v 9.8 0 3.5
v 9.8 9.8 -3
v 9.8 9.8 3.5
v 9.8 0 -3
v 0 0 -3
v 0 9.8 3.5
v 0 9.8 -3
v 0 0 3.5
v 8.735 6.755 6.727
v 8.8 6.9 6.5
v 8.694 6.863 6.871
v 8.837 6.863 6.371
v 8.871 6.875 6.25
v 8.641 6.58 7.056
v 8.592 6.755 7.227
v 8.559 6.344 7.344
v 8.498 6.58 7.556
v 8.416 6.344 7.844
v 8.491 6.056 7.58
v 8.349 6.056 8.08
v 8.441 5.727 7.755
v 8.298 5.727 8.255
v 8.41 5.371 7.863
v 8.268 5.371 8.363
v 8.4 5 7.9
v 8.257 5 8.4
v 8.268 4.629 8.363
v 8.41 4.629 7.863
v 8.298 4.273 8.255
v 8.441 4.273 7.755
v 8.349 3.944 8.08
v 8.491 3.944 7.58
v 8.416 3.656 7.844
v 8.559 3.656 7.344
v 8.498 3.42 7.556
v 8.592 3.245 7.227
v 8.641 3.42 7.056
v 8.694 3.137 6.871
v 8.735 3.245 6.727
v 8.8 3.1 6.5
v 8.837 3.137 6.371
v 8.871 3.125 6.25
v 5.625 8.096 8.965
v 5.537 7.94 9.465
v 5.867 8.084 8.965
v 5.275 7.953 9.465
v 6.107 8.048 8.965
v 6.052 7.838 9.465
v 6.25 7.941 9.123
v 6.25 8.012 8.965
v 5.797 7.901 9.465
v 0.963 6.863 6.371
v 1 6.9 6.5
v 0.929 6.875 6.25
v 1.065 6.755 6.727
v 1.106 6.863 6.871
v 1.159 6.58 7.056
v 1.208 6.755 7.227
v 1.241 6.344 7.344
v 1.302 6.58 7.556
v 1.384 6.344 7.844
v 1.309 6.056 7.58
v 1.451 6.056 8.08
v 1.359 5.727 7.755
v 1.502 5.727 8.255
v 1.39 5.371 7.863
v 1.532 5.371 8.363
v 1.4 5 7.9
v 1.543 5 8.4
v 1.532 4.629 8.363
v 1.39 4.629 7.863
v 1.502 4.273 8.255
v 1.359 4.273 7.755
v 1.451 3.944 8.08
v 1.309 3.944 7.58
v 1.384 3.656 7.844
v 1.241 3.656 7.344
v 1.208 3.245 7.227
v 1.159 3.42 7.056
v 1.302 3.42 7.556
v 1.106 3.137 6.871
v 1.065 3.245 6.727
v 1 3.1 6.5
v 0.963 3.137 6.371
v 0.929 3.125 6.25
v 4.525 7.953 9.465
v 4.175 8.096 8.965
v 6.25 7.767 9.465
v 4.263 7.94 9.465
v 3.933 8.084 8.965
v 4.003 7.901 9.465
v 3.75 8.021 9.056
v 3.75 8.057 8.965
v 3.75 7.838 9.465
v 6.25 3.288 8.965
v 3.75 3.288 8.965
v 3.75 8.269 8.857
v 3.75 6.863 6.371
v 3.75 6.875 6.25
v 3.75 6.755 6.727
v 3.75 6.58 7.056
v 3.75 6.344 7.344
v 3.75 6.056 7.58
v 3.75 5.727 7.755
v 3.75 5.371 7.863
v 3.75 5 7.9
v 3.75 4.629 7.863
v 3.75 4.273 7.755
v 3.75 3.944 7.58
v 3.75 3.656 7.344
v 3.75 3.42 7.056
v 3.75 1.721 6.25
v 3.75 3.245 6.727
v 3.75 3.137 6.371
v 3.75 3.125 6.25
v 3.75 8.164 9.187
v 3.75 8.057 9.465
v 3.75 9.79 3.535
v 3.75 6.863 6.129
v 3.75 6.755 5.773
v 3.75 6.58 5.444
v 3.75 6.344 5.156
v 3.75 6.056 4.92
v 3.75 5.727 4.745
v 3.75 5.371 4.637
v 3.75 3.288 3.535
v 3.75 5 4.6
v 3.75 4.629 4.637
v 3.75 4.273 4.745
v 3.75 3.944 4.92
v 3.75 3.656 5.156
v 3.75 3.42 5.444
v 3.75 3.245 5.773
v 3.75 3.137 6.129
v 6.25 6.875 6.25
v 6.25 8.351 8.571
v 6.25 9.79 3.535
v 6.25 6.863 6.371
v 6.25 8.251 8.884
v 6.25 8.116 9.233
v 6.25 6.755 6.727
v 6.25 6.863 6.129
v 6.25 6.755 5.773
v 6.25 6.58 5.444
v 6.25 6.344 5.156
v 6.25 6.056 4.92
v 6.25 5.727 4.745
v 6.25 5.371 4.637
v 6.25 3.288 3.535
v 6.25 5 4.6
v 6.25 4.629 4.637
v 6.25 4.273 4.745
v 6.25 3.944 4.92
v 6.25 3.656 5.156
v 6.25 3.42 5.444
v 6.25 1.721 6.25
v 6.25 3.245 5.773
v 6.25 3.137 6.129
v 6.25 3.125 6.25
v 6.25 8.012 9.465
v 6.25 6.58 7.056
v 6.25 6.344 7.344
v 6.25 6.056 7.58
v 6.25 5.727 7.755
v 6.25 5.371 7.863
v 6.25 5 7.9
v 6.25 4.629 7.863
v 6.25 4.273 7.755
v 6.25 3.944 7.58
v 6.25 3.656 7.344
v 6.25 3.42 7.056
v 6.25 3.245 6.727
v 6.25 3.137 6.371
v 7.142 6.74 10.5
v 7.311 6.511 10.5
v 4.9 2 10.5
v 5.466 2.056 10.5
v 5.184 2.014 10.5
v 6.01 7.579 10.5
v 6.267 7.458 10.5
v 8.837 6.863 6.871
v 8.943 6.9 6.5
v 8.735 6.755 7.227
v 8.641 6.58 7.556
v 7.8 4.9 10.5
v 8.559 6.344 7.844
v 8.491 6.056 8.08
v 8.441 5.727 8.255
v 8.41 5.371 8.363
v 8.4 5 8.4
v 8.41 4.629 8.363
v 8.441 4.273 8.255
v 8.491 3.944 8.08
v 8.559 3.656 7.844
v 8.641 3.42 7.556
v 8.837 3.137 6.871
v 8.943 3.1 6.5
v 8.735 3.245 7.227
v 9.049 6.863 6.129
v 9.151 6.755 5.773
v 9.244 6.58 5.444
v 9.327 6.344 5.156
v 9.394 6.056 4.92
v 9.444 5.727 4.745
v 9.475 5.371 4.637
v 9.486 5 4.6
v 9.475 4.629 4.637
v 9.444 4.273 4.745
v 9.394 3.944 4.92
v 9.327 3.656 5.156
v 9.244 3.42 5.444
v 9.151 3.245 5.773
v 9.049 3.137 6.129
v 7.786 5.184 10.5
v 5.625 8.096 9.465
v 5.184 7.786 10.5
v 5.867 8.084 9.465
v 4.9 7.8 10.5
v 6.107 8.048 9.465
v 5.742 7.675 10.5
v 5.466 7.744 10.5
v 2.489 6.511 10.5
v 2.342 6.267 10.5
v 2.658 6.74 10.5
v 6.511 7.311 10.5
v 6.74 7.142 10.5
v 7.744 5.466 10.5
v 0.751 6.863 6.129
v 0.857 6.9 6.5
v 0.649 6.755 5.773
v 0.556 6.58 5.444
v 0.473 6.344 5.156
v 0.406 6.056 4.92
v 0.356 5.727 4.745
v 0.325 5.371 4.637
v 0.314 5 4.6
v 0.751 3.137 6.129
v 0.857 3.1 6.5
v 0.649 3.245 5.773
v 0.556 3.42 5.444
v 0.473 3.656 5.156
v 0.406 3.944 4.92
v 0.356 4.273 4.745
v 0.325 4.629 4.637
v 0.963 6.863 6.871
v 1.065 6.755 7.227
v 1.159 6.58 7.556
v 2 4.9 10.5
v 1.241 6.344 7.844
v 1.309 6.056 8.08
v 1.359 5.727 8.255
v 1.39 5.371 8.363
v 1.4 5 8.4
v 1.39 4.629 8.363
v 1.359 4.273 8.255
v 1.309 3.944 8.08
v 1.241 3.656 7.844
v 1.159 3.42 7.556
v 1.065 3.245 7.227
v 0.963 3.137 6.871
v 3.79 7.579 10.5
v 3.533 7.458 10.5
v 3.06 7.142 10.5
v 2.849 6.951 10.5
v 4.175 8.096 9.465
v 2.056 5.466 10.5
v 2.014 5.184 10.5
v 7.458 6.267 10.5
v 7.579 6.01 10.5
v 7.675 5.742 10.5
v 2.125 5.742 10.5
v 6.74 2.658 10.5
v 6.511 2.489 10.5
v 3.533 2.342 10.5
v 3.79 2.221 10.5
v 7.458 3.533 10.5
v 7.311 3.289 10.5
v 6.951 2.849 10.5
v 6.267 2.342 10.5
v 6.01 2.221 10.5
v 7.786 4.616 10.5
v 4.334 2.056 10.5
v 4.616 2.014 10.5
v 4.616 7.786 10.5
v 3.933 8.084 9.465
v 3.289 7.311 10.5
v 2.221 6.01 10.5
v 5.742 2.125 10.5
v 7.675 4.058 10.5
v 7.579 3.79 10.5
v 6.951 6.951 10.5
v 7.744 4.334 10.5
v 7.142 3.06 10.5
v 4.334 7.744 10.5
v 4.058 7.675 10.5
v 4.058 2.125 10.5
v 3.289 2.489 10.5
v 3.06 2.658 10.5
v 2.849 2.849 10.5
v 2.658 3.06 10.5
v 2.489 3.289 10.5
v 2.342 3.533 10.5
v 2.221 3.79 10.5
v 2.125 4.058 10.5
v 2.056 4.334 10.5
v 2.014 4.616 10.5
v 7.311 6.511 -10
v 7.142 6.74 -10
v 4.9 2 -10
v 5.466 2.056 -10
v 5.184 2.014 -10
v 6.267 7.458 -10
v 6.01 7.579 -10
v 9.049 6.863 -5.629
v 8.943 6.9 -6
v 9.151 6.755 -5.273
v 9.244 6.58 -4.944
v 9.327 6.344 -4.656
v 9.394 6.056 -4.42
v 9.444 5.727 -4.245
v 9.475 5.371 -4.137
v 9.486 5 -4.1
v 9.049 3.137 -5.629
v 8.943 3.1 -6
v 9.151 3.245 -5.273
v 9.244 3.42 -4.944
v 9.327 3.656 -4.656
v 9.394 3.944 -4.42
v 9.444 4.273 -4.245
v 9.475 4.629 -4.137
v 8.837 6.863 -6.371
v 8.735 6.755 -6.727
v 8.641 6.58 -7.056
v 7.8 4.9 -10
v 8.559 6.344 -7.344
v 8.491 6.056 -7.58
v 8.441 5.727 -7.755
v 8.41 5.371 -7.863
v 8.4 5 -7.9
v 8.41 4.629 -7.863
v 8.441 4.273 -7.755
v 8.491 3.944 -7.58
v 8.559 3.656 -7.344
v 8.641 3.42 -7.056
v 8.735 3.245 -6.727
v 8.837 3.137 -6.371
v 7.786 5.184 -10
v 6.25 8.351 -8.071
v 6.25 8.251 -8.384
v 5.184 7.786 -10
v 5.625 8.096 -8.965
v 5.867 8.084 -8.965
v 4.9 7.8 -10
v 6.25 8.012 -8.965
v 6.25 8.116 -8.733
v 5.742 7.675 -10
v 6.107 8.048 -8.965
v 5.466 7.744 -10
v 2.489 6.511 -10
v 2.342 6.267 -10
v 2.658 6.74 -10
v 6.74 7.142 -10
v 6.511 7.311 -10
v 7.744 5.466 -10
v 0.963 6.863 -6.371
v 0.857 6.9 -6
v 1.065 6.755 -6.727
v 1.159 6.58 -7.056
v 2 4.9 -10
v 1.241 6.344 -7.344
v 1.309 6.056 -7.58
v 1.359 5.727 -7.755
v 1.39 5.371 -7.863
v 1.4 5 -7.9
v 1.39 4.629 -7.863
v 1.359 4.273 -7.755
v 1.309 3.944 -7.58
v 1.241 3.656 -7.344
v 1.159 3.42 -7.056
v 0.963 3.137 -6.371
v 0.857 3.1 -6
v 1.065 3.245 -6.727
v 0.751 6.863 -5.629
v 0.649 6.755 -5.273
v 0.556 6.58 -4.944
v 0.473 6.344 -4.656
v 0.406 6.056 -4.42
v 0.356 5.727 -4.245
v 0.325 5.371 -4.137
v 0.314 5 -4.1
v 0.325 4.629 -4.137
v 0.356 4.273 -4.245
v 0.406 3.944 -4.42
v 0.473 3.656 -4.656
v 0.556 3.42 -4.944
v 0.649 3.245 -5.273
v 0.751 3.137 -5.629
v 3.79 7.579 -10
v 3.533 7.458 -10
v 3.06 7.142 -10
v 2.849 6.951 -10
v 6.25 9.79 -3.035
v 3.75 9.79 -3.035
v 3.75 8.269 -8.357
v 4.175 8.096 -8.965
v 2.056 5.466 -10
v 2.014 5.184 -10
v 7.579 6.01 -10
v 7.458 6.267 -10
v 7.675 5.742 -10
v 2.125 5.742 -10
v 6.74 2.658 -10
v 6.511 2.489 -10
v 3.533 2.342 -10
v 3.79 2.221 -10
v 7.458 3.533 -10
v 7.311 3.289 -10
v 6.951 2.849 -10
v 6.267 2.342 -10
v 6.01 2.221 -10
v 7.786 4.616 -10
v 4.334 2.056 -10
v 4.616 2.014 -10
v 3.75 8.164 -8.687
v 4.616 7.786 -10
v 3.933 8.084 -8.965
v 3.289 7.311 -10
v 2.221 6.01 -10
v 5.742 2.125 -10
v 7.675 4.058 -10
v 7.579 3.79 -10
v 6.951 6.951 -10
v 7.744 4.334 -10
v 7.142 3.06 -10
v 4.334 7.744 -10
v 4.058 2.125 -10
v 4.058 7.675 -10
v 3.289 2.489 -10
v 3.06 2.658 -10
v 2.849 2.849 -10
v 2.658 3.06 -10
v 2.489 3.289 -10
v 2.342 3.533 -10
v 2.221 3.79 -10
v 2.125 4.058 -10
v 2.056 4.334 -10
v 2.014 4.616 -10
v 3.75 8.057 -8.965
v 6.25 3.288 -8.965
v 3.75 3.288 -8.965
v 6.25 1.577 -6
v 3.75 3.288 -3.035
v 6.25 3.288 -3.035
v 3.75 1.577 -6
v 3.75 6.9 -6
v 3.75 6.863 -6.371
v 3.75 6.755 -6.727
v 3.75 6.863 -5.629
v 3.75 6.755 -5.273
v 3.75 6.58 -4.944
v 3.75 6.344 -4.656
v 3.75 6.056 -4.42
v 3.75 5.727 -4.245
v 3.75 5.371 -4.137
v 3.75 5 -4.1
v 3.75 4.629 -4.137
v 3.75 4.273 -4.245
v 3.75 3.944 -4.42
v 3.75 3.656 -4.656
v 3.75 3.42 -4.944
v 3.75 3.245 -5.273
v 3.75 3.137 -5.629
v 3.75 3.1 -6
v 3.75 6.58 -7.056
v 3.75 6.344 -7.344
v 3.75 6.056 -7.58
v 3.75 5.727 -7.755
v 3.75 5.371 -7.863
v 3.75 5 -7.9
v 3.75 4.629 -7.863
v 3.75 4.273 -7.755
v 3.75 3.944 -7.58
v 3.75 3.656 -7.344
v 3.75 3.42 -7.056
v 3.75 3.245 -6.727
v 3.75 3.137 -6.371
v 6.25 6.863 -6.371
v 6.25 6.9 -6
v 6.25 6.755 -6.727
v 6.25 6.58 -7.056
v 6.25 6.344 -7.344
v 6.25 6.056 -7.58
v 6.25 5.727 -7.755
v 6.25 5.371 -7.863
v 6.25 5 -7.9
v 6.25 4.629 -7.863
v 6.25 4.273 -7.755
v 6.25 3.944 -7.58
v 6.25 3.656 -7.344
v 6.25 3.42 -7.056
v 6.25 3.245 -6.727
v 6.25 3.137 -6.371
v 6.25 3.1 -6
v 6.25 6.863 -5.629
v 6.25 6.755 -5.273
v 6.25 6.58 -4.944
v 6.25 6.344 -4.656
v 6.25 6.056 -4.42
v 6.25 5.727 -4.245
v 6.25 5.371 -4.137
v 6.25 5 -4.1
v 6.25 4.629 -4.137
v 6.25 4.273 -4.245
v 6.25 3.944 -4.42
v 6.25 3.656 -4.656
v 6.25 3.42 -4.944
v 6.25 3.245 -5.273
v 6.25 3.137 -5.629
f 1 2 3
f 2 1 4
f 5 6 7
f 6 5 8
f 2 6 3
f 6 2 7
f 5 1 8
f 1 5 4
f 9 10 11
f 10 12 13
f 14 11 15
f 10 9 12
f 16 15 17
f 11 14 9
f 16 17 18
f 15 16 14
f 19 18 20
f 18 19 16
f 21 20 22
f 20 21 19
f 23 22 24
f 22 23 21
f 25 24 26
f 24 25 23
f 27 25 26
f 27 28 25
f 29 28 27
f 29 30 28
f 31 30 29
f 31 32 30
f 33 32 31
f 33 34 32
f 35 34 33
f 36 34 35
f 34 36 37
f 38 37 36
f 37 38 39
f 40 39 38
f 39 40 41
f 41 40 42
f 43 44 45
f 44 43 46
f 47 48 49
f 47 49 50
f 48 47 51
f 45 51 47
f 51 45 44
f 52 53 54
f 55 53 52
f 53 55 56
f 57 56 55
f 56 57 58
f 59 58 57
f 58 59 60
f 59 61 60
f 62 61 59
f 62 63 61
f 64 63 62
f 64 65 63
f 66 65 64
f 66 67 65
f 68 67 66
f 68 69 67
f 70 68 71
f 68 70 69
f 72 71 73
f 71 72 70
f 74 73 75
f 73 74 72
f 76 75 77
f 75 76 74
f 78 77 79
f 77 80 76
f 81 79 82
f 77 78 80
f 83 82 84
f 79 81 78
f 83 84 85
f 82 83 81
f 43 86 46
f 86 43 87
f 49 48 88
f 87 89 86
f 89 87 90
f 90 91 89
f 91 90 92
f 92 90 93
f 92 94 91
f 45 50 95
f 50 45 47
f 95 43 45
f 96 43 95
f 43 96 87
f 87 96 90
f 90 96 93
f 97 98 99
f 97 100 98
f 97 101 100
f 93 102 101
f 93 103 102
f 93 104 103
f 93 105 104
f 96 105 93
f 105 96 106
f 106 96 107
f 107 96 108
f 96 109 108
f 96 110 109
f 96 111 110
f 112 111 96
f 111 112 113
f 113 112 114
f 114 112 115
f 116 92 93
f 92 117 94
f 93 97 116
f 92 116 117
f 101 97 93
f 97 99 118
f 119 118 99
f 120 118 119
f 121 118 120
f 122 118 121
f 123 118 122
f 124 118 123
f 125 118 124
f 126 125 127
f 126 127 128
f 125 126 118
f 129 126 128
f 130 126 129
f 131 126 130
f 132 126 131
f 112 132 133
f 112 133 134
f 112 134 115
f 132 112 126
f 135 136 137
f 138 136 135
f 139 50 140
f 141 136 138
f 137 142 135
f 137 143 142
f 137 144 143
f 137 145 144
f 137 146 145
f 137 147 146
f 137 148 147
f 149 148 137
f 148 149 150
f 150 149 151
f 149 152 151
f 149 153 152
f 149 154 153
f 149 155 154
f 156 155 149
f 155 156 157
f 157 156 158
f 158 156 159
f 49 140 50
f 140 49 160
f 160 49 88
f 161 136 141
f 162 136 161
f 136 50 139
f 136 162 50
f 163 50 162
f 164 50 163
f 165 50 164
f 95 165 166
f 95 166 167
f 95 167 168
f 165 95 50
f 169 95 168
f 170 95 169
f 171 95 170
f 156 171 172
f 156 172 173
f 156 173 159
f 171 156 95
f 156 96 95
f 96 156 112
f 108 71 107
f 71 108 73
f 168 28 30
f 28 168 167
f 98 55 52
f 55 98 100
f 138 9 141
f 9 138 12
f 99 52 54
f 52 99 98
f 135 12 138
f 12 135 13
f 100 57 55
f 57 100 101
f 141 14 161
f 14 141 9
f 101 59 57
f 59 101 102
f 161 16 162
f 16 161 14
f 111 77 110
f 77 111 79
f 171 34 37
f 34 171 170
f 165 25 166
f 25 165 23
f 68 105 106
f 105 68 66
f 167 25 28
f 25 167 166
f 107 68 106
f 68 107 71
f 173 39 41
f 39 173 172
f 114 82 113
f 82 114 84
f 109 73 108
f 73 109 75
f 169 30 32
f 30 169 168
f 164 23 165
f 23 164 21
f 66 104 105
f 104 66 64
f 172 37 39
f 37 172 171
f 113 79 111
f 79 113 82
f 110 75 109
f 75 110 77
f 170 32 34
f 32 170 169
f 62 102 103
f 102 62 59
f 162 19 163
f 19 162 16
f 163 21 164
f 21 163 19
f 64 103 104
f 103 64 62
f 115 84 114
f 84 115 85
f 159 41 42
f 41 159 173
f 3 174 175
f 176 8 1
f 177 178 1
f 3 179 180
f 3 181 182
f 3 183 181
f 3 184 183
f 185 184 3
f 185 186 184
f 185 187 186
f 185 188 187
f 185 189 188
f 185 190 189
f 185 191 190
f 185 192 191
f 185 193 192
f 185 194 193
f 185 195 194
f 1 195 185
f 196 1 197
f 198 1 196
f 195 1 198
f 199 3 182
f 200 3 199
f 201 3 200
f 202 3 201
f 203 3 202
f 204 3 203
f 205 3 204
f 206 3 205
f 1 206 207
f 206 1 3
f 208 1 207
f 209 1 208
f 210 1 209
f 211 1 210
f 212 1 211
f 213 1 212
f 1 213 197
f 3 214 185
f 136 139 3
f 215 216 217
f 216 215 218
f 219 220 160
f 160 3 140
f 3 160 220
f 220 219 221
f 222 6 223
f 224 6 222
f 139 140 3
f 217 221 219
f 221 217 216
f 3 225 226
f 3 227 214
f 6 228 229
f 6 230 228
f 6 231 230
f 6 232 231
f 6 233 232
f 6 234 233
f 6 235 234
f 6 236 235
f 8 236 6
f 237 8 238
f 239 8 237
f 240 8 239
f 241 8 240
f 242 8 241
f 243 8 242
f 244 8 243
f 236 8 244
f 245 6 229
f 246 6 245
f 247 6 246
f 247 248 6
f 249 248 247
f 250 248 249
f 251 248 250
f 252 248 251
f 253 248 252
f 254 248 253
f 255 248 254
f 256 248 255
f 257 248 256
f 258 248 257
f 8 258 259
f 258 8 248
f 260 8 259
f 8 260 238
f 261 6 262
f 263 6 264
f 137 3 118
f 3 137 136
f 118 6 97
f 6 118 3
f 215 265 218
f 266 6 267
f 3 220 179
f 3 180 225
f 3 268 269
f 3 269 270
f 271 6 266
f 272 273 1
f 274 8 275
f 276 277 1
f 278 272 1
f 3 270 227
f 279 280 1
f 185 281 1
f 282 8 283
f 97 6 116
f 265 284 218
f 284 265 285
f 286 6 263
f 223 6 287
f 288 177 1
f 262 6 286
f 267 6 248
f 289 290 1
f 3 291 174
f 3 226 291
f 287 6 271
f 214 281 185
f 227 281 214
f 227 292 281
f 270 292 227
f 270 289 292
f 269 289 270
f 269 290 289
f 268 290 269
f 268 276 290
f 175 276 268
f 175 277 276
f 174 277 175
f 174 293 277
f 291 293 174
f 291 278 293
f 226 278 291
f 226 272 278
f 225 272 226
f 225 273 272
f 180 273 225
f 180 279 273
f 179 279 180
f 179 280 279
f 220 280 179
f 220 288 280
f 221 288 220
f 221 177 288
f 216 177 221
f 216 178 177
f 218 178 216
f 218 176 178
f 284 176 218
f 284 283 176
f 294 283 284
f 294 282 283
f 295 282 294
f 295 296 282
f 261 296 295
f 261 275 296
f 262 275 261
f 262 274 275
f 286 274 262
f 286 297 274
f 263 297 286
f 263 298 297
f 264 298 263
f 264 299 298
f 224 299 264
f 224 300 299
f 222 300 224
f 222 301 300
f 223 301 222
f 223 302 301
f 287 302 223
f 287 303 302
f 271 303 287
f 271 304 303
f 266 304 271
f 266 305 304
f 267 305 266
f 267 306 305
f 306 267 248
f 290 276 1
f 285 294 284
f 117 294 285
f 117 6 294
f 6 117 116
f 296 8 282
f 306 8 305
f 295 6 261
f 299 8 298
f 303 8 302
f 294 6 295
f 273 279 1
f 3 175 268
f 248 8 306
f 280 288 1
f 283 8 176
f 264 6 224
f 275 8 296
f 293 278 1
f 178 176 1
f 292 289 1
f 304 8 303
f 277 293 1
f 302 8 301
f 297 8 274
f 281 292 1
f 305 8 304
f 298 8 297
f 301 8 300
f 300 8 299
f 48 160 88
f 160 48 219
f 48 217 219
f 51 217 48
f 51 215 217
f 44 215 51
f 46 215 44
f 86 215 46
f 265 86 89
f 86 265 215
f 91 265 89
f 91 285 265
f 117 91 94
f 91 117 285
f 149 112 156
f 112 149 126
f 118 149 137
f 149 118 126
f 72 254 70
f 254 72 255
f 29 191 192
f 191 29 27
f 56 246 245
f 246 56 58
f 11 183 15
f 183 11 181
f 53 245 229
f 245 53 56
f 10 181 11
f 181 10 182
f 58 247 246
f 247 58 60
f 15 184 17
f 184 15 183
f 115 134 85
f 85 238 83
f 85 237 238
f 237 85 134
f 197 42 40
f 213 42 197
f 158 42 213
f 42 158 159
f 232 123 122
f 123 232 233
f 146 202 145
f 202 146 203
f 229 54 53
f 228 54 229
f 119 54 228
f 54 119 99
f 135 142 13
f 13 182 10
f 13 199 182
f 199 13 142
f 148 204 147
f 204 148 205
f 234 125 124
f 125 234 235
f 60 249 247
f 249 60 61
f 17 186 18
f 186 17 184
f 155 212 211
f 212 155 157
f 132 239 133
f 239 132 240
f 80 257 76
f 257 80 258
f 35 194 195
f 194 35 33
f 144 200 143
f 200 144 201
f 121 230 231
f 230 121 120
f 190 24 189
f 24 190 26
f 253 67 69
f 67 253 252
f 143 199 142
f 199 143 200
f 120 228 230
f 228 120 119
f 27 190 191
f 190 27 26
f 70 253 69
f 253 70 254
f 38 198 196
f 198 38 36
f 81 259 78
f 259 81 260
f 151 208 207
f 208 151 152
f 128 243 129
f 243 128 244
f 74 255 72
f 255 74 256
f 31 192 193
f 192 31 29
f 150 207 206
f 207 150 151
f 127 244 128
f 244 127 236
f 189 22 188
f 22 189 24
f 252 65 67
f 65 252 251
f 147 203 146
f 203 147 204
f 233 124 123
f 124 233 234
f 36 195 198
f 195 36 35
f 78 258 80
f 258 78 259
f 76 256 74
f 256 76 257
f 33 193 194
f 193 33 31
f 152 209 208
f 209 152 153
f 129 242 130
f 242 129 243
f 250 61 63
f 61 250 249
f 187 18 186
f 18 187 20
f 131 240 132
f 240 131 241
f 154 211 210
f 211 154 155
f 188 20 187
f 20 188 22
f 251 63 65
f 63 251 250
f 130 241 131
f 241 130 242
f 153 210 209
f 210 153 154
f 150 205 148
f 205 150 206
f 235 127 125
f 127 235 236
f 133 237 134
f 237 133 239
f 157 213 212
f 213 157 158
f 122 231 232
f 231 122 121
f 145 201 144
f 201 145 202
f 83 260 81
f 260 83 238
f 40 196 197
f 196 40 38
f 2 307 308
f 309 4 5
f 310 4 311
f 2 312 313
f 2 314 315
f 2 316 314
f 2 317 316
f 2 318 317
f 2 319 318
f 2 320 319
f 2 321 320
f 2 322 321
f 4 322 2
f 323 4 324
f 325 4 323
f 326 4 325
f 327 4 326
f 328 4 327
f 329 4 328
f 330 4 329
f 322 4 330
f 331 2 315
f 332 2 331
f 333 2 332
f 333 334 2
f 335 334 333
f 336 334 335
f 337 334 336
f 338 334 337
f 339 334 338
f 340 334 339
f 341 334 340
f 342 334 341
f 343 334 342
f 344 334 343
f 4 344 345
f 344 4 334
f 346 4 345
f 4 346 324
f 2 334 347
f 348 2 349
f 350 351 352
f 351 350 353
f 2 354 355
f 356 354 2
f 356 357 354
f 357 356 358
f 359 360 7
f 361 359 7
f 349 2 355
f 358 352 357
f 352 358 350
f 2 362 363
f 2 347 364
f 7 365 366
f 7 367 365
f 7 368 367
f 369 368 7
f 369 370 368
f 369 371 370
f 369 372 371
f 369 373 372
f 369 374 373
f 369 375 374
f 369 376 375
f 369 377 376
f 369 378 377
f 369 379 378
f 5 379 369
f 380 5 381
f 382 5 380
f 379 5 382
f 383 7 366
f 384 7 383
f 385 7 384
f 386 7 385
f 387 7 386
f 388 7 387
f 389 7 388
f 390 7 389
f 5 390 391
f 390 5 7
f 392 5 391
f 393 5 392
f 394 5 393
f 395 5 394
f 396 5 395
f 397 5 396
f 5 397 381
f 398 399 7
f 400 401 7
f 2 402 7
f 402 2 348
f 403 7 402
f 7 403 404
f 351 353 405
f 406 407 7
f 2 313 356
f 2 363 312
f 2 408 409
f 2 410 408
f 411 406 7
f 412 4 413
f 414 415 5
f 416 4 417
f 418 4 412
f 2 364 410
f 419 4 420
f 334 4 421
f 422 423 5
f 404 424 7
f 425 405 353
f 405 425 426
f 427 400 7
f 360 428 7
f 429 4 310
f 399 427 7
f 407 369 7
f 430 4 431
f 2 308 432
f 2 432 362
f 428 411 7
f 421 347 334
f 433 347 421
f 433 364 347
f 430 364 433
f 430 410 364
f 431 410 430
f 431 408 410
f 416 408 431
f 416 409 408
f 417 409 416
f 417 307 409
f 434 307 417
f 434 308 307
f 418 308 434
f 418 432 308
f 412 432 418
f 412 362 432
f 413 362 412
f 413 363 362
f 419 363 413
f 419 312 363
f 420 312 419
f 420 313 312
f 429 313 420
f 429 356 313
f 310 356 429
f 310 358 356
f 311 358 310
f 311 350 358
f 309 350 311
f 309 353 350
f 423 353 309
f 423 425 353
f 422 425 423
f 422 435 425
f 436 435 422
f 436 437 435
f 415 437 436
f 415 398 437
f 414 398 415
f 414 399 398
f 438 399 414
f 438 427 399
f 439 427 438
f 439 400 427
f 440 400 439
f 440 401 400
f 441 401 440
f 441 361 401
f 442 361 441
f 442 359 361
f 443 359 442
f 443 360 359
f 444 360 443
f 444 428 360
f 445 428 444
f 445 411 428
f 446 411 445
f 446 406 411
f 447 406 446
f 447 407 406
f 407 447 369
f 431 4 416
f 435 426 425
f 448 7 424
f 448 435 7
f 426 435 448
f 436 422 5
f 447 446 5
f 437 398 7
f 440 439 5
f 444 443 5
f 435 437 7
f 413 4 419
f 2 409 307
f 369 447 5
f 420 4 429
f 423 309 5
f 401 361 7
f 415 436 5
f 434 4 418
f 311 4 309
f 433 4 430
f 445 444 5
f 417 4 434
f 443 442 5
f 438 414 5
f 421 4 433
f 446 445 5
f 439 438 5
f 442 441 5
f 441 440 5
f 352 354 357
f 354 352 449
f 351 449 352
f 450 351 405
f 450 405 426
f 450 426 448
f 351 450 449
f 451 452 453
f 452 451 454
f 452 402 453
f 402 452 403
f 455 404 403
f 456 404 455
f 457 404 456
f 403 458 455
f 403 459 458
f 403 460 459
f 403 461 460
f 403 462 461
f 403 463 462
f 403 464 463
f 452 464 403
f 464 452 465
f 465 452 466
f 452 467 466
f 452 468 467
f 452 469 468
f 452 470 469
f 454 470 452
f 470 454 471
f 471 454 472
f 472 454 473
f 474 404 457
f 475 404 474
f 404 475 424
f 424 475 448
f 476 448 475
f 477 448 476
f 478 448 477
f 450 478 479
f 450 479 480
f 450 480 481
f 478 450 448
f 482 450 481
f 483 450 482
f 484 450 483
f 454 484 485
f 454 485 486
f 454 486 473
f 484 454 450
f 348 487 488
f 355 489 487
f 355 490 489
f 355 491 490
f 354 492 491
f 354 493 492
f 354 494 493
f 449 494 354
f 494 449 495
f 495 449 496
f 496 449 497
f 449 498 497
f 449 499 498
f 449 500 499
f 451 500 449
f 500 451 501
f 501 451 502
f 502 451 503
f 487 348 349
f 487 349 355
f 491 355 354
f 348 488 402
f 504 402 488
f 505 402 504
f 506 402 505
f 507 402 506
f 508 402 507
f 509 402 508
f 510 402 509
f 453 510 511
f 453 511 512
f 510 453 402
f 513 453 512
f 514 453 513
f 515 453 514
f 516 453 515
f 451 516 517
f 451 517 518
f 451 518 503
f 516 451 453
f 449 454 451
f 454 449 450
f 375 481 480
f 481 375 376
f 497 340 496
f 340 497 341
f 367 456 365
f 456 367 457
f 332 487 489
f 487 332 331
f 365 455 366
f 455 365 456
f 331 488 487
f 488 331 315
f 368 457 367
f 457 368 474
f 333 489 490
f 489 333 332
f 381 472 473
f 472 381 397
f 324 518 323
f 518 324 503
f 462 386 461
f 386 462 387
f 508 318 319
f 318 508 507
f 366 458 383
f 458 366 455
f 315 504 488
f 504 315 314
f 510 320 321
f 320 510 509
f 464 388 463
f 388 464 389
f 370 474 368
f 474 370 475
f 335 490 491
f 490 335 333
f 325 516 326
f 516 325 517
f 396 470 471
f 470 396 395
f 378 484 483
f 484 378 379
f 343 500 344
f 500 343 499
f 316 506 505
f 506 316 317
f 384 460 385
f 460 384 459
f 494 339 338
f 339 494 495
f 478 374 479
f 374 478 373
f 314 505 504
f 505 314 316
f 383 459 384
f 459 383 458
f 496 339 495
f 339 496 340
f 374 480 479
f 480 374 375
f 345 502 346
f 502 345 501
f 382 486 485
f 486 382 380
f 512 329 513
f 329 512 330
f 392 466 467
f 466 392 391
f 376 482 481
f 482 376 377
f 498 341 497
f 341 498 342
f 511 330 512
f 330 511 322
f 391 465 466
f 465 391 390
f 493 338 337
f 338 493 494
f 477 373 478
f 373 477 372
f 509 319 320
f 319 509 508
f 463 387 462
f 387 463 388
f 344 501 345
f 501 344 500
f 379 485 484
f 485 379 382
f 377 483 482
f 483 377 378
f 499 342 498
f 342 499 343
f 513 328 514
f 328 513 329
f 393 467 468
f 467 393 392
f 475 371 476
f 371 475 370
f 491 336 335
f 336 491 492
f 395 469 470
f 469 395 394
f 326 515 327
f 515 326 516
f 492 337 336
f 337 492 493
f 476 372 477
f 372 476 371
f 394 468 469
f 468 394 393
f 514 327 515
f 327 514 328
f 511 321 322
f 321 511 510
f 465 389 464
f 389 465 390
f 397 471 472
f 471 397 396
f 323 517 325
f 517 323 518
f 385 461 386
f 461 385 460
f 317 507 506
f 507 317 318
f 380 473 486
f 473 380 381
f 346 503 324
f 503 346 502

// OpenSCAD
// file: ../profiles.scad
/*
    case-files v2
    This file contains
    Example usage:

 profileName = "mini";
 varName = "mainRailSideMountScrewType";

 profile = getProfile(profileName);
 echo("val:", getConfigValue(profile, varName));
 */

_profileConfigs = [
    ["default", [
      ["maxUnitWidth", 205],
      ["maxUnitDepth", 205],
      ["screwDiff", 10],
      ["numRailScrews", 20],
      ["mainRailScrewType", "m4"],
      ["mainRailSideMountScrewType", "m4"],
      ["rackFrameScrewType", "m3"],
      ["baseRoundness", 5],
    ]],
    ["micro", [
      ["maxUnitWidth", 105],
      ["maxUnitDepth", 105],
      ["numRailScrews", 10],
      ["baseRoundness", 5]
    ]],
    ["mini", [
      ["maxUnitWidth", 205],
      ["maxUnitDepth", 205],
      ["numRailScrews", 20],
      ["baseRoundness", 5]
    ]]
  ];

function _getConfigValueRaw(profile, varName) = profile[search([varName], profile)[0]][1];
function _getProfileRaw(profileName) = _profileConfigs[search([profileName], _profileConfigs)[0]][1];

function _getConfigValueOrThrowError(val) = val == undef? assert(false, "blah") 0: val;
function _getConfigValueOrDefault(val, default) = val == undef? default: val;

function getConfigValue(profile, varName) =
  _getConfigValueOrDefault(
    _getConfigValueRaw(profile, varName),
    _getConfigValueOrThrowError(_getConfigValueRaw(getProfile("default"), varName))
  );

function getProfile(profileName) = _getConfigValueOrThrowError(_getProfileRaw(profileName));
// file: ../config.scad
/*
   case-files v2
   This file contains parameters used for declaring/generating a customized rack frame.

   - All dimensions are in millimetres (mm) unless stated otherwise.
   - "_N" appended to a module is meant to denote that this module is a negative volume, and should only be used to
     substract from other volumes. "_P" is meant to denote a positive value. Modules are positive by default.
*/
include <./profiles.scad>

profileName = "micro";
profile = getProfile(profileName);

// echo("Profile:", profile);

function getConfig(name) = getConfigValue(profile, name);

// Maximum width for rack-mount units. Change this according your max expected enclosure width.
// Changing this will directly affect the required build volume.
maxUnitWidth = getConfig("maxUnitWidth");

// Maximum (recommended) unit depth. There technically isn't a max unit depth because there's no physical bound on
// how far a rack unit can extrude back. This parameter basically controls the distance between the front of the front
// rails and the back of the back rails. Changing this will directly affect the required build volume.
maxUnitDepth = getConfig("maxUnitDepth");

// Vertical distance between the midpoint of adjacent screws mounts. Affects build volume.
screwDiff = getConfig("screwDiff");

// Number screw slots on the main rail. Affects build volume.
numRailScrews = getConfig("numRailScrews");

// Screw type used for rackmount units. See screws.scad.
mainRailScrewType = getConfig("mainRailScrewType");

// Screw type used to affix side rails.
mainRailSideMountScrewType = getConfig("mainRailSideMountScrewType");

// Screw type used for constructing the actual rack frame.
rackFrameScrewType = getConfig("rackFrameScrewType");
// Currently, only m3 screws are supported here (tolerance issues)
assert(rackFrameScrewType == "m3");

// Fillet radius for main rack profile
baseRoundness = getConfig("baseRoundness");
// file: ../../helper/screws.scad
/* Some common screw dimensions and helper functions/modules */

include <./math.scad>
include <./common.scad>

/********************************************************************************/
// M3 dimensions
m3HoleRadiusSlack = 0.4; // higher slack for not-so straight heat set inserts
m3Diameter = 3.0;
m3Radius = m3Diameter / 2.0;
m3RadiusSlacked = m3Radius + m3HoleRadiusSlack;

m3CounterSunkHeadRadius = 3;
m3CounterSunkHeadLength = 1.7;

m3HexNutWidthAcrossFlats = 5.41;
m3HexNutWidthAcrossCorners = FtoG(m3HexNutWidthAcrossFlats);
m3HexNutThickness = 2.2;

m3HeatSetInsertSlotRadiusSlack = -0.1;
m3HeatSetInsertSlotHeightSlack = 0.5;

m3HeatSetInsertSlotRadius = 2.3;
m3HeatSetInsertSlotHeight = 5.7;

m3HeatSetInsertSlotRadiusSlacked = m3HeatSetInsertSlotRadius+m3HeatSetInsertSlotRadiusSlack;
m3HeatSetInsertSlotHeightSlacked = m3HeatSetInsertSlotHeight+m3HeatSetInsertSlotHeightSlack;

/********************************************************************************/
// M4 dimensions
m4HoleRadiusSlack = 0.15;
m4Diameter = 4.0;
m4Radius = m4Diameter / 2.0;
m4RadiusSlacked = m4Radius + m4HoleRadiusSlack;
m4HexNutWidthAcrossFlats = 6.89;
m4HexNutWidthAcrossCorners = FtoG(m4HexNutWidthAcrossFlats);
m4HexNutThickness = 3.07;

/********************************************************************************/

module heatSetInsertSlot_N(screwType, topExtension=inf50) {
  if (screwType == "m3") {
    union() {
      // actual slot for insert
      cylinder(h = m3HeatSetInsertSlotHeightSlacked, r = m3HeatSetInsertSlotRadiusSlacked);

      // extra space above slot to help with insertion
      translate(v=[0, 0, m3HeatSetInsertSlotHeightSlacked])
      cylinder(h = topExtension, r = m3HeatSetInsertSlotRadiusSlacked);
    }
  } else {
    error("Unsupported screw type");
  }
}

function screwRadiusSlacked(screwType) =
  (screwType == "m3")
  ? m3RadiusSlacked
  : (screwType == "m4")
  ? m4RadiusSlacked
  : error("Unsupported screw type");


module counterSunkHead_N(screwType, screwExtension=0, headExtension=0) {

  if (screwType == "m3") {
    translate(v=[0,0,-m3CounterSunkHeadLength])
    union() {
      cylinder(r1 = m3RadiusSlacked, r2 = m3CounterSunkHeadRadius, h = m3CounterSunkHeadLength);

      translate(v = [0, 0, -screwExtension])
      cylinder(r = m3RadiusSlacked, h = screwExtension);

      translate(v = [0, 0, m3CounterSunkHeadLength])
      cylinder(r = m3CounterSunkHeadRadius, h = headExtension);
    }
  } else {
    error("Unsupported screw type");
  }
}


module hexNutPocket_N(screwType, openSide=true) {
  if (screwType == "m3") {
    hexNutPocketHelper_N(m3RadiusSlacked, m3HexNutWidthAcrossCorners / 2 + 0.3, m3HexNutThickness + 0.3, openSide=openSide);
  } else if (screwType == "m4") {
    hexNutPocketHelper_N(m4RadiusSlacked, m4HexNutWidthAcrossCorners / 2 + 0.1, m4HexNutThickness + 0.2, openSide=openSide);
  } else {
    error("Unsupported screw type");
  }
}

module hexNutPocketHelper_N(innerRadius, widthAcrossCorners, thickness, openSide=true) {
  union() {
    hull() {
      // hexagonal cylinder representing where the nut should fit
      cylinder(r = widthAcrossCorners, h = thickness, center = true, $fn = 6);

      // negative volume for sliding in the nut
      translate(v = [inf50, 0, 0])
      cylinder(r = widthAcrossCorners, h = thickness, center = true, $fn = 6);
    }

    // negative volume for screw lead
    translate(v = [0, 0, - 10])
    cylinder(r = innerRadius, h = inf50, $fn = 32);

    if (openSide) {
      hull() {
        translate(v = [inf50, 0, 0])
        cylinder(r = innerRadius, h = inf50, $fn = 32);
        cylinder(r = innerRadius, h = inf50, $fn = 32);
      }
    }
  }
}

// Convert a regular hexagon widthAcrossFlats to widthAcrossCorners
function FtoG(widthAcrossFlats) = widthAcrossFlats * (2 / sqrt(3));

// Convert a regular hexagon widthAcrossCorners to widthAcrossFlats
function GtoF(widthAcrossCorners) = widthAcrossCorners * (sqrt(3) / 2);
// file: ../../helper/magnet.scad
// Dimensions for small cylindrical neodymium magnets that I bought off Amazon
magnetR = 3;
magnetH = 1.7;

magnetRSlack = 0.1;
magnetHSlack = 0.05;

magnetRSlacked = magnetR + magnetRSlack;
magnetHSlacked = magnetH + magnetHSlack;
// file: ../../helper/common.scad
/* Some commonly used variables plus functions
*/

$fn=64;
// TODO move these to math
eps=0.00001;

inf10 = 10;
inf50 = 50;
inf1000 = 1000;
inf = inf1000;


module apply_p() {
  union() {
    children(0);
    children(1);
  }
}

module apply_n() {
  difference() {
    children(1);
    children(0);
  }
}

module apply_pn() {
  difference() {
    union() {
      children(0);
      children(2);
    }
    children(1);
  }
}

module apply_np() {
  difference() {
    union() {
      children(1);
      children(2);
    }
    children(0);
  }
}
// file: ../../helper/math.scad
// TODO remove/rename this file
/* Example usage:
for (i=mirror4XY(midpoint=[0,0,0], offsetX=90, offsetY=90)) {
    translate(v=i)
        something();
}
*/

module mirror4XY(p, dx, dy) {

    px = p[0];
    py = p[1];

    translate(v=[px, py, 0])
    children(0);

    translate(v=[px+dx, py, 0])
    children(0);

    translate(v=[px, py+dy, 0])
    children(0);

    translate(v=[px+dx, py+dy, 0])
    children(0);
}
// file: ../stackConnector.scad
include <../helper/math.scad>
include <../helper/common.scad>
include <../helper/magnet.scad>
include <../helper/screws.scad>

include <./config.scad>

connectorRectWidth = 10;
connectorRectDepth = 10;
connectorTotalHeight = 10;
connectorSocketMagnetExtrudeHeight = 1;
connectorTaperStartHeight = 3;

connectorTopR = 3;

connectorRectPlugSlack = -0.2;
connectorRectSocketSlack = 0.2;

connectorBottomToScrew = 6;

stackConnectorBottom();

module stackConnectorBase(rectSlack, topSlack=0.0) {

  wSlacked = connectorRectWidth + rectSlack;
  dSlacked = connectorRectDepth + rectSlack;
  topRSlacked = connectorTopR + rectSlack/2;

  module connRect() {
    linear_extrude(height=eps)
    square(size = [wSlacked, dSlacked]);
  }

  module connTop() {
    linear_extrude(height=eps)
    circle(r=topRSlacked);
  }

  hull() {
    connRect();

    translate(v=[0,0,connectorTaperStartHeight])
    connRect();
  }

  hull() {
    translate(v = [0, 0, connectorTaperStartHeight])
    connRect();

    translate(v=[wSlacked/2, dSlacked/2, connectorTotalHeight+topSlack])
    connTop();
  }
}


module stackConnectorSocket_N() {

  wSlacked = connectorRectWidth + connectorRectSocketSlack;
  dSlacked = connectorRectDepth + connectorRectSocketSlack;

  bevelSlack = 0.6;
  bevelR = wSlacked + bevelSlack;
  bevelW = dSlacked + bevelSlack;
  bevelH = 0.6;

  screwExtension = 4;


  union() {
    stackConnectorBase(connectorRectSocketSlack, topSlack=0.4);

    translate(v = [-screwExtension, connectorRectDepth/2, connectorBottomToScrew])
    rotate(a = [0, -90, 0])
    counterSunkHead_N(rackFrameScrewType, screwExtension = 5, headExtension = 10);

    // bevel at the lip of the socket to guide the plug, as well as mitigate elephant foot during 3d printing
    hull() {
      translate(v = [0, 0, bevelH])
      linear_extrude(height = eps)
      square(size = [wSlacked, dSlacked]);

      translate(v = [-bevelSlack/2, -bevelSlack/2, 0])
      linear_extrude(height = eps)
      square(size = [bevelR, bevelW]);
    }
  }
}

module stackConnectorPlug() {

  difference() {
    stackConnectorBase(connectorRectPlugSlack);

    translate(v=[connectorRectWidth/2,connectorRectDepth/2,connectorBottomToScrew])
    rotate(a=[0,0,90])
    rotate(a=[90,0,0])
    hexNutPocket_N(rackFrameScrewType, openSide=false);
  }
}

module stackConnectorDual() {

  space = 0.5; // extra space inbetween

  translate(v=[0,0,space])
  stackConnectorPlug();

  mirror(v=[0,0,1])
  stackConnectorPlug();

  cube(size=[connectorRectWidth+connectorRectPlugSlack, connectorRectDepth+connectorRectPlugSlack, space]);
}


module stackConnectorBottom() {

  height = 2; // space between bottom and floor

  stackConnectorPlug();
  translate(v=[0,0,-height])
  cube(size=[connectorRectWidth+connectorRectPlugSlack, connectorRectDepth+connectorRectPlugSlack, height]);
}
// main file
include <../stackConnector.scad>

// Oriented for 3d printing. No supports required, but it's reccommended to print this with a brim.
// Adding a brim will require some post-processing in the form of trimming the bottom.
stackConnectorDual();
